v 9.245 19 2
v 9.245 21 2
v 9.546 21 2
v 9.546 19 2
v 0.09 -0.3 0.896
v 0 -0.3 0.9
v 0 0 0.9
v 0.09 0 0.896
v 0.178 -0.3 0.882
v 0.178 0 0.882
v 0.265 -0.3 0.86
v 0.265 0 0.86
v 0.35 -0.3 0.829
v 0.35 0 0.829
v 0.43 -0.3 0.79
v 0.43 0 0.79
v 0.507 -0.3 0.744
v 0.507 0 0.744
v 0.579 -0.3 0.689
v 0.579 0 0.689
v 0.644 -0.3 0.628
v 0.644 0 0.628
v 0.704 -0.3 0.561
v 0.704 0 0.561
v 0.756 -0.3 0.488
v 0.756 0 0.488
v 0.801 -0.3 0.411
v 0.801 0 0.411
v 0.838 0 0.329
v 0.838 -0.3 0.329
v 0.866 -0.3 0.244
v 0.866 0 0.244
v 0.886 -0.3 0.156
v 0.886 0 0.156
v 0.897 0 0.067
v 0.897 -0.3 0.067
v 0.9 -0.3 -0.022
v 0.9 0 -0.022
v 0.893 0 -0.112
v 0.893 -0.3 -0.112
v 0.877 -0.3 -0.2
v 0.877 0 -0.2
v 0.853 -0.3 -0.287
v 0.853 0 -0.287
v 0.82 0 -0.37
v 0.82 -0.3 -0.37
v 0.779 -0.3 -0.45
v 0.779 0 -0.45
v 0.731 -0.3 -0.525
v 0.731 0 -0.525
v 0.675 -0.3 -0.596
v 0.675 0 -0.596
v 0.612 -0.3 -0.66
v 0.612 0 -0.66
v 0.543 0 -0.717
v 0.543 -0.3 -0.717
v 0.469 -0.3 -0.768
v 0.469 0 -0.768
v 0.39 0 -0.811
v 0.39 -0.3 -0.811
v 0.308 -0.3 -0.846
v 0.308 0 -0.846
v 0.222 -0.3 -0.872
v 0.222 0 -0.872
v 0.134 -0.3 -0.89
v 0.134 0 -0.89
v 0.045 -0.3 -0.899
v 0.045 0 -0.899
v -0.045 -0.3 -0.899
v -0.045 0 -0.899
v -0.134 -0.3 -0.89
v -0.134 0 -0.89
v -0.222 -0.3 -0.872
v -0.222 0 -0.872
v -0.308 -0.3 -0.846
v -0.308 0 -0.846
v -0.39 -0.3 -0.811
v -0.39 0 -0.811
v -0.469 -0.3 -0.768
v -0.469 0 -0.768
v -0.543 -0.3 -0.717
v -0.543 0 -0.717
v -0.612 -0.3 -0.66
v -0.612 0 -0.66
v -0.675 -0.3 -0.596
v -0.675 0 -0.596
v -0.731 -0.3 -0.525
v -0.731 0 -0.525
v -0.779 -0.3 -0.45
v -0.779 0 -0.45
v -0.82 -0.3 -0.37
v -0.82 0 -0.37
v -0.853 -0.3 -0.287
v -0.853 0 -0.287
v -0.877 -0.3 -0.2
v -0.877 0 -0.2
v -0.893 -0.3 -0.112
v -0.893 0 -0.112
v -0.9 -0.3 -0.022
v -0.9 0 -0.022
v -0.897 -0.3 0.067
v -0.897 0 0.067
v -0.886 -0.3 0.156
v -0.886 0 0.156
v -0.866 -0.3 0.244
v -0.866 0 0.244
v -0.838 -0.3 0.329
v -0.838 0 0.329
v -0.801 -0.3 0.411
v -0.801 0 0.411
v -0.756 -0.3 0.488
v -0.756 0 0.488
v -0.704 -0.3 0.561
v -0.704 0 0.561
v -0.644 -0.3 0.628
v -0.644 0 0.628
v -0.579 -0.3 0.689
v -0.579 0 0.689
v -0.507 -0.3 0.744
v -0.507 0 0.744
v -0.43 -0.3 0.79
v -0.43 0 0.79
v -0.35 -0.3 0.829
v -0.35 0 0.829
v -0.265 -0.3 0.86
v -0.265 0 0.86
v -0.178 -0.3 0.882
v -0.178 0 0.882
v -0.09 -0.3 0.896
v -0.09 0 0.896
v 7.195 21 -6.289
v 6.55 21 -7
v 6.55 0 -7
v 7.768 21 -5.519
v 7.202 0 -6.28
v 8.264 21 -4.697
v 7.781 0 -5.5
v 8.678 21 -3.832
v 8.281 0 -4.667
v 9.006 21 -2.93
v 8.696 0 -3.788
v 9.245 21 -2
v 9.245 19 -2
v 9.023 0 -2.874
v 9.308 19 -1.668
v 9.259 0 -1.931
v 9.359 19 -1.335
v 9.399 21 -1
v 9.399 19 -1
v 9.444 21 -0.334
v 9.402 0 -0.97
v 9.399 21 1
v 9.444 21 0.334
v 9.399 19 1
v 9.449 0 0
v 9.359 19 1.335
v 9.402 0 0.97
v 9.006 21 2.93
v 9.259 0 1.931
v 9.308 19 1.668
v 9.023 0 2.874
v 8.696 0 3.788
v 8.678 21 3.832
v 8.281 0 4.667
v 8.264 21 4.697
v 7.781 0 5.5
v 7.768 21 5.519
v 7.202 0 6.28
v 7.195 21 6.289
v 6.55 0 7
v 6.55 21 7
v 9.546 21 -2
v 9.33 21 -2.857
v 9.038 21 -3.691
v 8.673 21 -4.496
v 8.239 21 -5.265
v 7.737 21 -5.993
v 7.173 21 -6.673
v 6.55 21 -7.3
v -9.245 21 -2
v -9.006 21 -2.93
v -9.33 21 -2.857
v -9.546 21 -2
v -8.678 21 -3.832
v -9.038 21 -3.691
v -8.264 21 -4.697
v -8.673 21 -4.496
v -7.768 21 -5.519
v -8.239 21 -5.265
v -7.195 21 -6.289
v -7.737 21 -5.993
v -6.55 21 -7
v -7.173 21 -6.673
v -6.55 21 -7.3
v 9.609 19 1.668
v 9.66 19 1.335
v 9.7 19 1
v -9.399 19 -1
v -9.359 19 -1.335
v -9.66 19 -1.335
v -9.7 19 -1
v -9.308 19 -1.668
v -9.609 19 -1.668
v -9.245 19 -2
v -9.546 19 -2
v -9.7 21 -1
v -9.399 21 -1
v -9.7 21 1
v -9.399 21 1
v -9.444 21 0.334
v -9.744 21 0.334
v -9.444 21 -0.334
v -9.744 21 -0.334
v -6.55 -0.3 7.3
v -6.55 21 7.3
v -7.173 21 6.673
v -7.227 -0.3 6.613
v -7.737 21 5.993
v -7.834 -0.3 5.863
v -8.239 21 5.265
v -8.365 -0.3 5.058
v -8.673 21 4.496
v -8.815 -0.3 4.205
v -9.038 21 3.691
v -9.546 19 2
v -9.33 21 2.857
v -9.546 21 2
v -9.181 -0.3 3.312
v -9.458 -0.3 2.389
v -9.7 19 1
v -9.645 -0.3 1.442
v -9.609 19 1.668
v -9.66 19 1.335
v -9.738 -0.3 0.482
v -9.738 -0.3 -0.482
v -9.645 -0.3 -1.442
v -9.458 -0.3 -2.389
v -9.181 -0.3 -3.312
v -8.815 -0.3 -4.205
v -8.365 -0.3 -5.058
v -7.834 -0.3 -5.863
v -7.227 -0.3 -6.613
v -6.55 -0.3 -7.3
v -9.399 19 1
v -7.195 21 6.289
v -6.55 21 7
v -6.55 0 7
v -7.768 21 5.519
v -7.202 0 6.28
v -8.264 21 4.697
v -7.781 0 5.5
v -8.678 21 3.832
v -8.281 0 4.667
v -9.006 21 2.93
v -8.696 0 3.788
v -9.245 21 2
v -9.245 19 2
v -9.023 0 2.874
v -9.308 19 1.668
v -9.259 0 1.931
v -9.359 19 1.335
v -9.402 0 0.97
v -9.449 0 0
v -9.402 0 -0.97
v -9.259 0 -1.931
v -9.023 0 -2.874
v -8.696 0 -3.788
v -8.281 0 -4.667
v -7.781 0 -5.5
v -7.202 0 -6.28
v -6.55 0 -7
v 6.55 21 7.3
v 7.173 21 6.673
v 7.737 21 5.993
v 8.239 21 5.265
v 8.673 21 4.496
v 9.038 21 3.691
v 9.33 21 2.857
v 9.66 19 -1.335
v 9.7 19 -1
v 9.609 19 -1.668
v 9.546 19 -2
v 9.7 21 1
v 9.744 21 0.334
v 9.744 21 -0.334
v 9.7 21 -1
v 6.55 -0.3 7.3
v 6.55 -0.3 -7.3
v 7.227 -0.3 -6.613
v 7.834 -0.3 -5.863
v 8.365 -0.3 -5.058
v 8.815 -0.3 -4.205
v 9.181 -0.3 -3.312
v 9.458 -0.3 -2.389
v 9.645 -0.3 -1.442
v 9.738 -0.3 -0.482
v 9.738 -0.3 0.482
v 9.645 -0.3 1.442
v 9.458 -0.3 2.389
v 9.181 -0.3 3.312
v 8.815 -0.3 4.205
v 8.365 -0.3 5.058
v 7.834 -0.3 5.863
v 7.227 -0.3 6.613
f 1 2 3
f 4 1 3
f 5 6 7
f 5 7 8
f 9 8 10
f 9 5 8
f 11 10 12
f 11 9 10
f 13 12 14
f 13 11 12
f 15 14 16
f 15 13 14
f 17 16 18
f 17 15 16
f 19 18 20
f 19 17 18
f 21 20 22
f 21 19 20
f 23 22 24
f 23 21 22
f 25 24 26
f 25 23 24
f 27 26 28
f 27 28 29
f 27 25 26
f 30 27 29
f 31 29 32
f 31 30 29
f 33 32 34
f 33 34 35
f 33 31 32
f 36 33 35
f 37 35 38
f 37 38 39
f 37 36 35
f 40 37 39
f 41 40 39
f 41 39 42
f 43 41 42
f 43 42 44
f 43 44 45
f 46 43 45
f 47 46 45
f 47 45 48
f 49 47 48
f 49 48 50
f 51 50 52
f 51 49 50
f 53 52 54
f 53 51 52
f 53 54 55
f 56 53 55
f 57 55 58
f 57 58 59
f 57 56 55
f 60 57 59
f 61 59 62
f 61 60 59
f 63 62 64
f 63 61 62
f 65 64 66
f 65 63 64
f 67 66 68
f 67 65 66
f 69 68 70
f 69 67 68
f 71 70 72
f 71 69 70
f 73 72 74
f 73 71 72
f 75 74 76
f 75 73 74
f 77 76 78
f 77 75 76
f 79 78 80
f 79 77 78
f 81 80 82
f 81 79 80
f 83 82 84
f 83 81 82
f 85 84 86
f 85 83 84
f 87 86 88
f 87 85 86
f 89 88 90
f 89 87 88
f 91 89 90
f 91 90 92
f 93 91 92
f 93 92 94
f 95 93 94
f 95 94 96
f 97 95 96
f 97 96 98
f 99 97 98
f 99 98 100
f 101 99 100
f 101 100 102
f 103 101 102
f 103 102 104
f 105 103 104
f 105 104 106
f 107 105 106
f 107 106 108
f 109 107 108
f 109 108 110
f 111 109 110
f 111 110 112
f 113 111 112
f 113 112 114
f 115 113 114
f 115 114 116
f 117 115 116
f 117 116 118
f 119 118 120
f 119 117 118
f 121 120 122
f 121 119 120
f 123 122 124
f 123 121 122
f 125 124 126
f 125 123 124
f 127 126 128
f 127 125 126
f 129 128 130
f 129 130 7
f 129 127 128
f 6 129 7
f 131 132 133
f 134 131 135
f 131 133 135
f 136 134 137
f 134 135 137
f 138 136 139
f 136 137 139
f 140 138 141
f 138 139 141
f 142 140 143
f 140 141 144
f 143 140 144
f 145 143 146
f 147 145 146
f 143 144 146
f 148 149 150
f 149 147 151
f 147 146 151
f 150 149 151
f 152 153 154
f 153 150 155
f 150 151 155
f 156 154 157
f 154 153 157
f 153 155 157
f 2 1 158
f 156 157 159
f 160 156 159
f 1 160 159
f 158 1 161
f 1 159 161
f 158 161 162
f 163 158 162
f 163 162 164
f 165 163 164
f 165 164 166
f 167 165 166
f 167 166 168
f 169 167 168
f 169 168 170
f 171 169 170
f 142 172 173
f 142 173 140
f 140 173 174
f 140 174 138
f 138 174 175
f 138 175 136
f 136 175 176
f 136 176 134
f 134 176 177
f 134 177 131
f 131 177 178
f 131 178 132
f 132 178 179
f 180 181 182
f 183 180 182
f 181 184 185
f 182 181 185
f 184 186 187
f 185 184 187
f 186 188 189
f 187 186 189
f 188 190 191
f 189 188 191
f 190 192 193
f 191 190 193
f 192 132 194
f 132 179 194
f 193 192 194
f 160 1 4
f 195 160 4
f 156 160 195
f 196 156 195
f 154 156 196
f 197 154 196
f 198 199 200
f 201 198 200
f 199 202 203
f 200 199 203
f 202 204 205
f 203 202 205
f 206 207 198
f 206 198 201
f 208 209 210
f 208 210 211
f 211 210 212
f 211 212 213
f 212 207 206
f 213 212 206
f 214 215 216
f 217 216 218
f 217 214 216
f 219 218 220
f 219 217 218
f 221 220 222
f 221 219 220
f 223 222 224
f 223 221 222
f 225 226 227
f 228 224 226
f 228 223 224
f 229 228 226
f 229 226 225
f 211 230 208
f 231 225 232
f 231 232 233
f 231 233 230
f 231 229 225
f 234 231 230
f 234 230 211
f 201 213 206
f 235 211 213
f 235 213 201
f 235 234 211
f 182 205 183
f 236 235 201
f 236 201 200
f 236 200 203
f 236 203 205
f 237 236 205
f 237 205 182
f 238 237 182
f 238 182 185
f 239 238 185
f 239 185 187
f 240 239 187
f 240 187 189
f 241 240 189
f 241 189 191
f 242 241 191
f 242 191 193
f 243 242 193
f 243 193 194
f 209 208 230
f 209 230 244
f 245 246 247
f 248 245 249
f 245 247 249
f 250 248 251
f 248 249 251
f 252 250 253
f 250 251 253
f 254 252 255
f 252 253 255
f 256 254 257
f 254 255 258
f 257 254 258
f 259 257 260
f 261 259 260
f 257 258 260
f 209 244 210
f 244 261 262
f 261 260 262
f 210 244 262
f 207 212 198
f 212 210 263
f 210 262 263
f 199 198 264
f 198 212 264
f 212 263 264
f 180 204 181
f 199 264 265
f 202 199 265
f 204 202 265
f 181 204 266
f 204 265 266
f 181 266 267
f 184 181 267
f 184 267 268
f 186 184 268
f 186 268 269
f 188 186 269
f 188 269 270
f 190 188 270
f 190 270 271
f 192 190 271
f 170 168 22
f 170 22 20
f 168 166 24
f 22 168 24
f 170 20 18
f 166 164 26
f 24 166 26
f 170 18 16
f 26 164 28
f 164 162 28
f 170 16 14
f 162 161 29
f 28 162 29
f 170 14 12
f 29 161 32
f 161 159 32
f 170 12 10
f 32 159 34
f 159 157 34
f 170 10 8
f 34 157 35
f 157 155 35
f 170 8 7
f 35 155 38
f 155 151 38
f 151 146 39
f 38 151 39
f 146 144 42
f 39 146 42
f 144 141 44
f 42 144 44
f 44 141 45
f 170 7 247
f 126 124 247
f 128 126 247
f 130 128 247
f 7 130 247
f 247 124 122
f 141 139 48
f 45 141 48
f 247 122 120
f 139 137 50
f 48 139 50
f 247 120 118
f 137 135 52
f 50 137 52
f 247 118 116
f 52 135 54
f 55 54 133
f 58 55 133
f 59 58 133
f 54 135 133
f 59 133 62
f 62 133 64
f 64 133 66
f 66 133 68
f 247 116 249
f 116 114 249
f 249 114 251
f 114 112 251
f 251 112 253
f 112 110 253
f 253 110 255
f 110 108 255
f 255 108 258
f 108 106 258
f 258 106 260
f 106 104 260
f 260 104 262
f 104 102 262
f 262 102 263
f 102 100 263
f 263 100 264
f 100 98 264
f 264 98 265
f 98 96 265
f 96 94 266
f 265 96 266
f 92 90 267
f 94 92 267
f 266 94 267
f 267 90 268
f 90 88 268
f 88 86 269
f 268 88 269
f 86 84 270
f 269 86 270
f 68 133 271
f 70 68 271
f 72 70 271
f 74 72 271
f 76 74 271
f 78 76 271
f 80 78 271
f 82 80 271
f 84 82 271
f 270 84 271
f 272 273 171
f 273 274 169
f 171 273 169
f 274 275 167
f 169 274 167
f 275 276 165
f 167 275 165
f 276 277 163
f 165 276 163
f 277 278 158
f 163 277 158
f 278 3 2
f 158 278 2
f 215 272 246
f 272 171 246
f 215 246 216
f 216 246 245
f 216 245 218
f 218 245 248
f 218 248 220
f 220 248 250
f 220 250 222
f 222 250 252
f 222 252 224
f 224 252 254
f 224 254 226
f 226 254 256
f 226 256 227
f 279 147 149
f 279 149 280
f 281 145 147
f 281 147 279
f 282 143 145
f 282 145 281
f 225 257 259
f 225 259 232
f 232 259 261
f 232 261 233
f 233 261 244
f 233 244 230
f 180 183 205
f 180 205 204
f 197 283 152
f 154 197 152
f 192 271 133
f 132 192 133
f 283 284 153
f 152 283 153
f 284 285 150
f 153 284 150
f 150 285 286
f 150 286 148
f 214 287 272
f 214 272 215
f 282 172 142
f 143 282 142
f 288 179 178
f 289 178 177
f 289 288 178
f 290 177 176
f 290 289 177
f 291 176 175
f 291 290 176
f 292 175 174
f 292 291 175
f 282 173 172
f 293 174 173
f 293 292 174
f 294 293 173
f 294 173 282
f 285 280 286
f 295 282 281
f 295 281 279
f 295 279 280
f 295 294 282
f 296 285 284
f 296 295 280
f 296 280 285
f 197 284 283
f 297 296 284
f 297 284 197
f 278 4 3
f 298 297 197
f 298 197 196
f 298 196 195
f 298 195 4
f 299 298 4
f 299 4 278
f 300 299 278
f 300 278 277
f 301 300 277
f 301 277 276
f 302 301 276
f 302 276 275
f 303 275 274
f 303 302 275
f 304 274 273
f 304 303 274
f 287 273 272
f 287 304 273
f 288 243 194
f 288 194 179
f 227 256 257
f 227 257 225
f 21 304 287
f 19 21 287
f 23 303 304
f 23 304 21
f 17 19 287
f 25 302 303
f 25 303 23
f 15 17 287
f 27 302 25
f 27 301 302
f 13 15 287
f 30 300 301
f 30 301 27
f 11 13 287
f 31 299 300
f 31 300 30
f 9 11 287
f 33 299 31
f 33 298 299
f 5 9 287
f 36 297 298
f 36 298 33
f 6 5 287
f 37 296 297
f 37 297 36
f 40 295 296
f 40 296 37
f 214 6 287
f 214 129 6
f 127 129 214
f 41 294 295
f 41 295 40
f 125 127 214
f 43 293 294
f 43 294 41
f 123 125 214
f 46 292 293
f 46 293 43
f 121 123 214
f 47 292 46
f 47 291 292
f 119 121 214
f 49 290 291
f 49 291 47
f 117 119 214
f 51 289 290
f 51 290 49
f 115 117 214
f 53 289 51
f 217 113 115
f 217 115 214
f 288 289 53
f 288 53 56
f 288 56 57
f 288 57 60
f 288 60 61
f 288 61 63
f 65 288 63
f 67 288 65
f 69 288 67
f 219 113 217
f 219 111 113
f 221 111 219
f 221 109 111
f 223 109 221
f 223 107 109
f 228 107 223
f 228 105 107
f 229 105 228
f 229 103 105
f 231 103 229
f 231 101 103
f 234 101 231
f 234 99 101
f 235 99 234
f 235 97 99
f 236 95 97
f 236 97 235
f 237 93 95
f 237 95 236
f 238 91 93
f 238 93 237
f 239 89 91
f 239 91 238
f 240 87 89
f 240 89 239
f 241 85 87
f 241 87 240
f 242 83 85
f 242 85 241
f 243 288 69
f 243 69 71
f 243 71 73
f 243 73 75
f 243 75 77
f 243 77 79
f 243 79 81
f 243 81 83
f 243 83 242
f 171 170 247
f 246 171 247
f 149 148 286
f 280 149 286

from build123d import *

# Parameters (mm, degrees)
BOSS_EXTRUDE1_DEPTH = 21
BOSS_EXTRUDE2_START = -0.3
SKETCH3_R           = 0.9
BOSS_EXTRUDE2_DEPTH = 0.3
CUT_EXTRUDE1_DEPTH  = 2


with BuildPart() as part:
    # Sketch2 → Boss-Extrude1 (new body)
    with BuildSketch(Plane(origin=(0, 0, 0), x_dir=(1, 0, 0), z_dir=(0, 1, 0))):
        with BuildLine():
            Line((-6.55, 7.3), (6.55, 7.3))
            ThreePointArc((6.55, 7.3), (9.75, 0), (6.55, -7.3))
            Line((6.55, -7.3), (-6.55, -7.3))
            ThreePointArc((-6.55, -7.3), (-9.75, 0), (-6.55, 7.3))
        make_face()
        with BuildLine():
            Line((-6.55, 7), (6.55, 7))
            ThreePointArc((6.55, 7), (9.449494937, 0), (6.55, -7))
            Line((6.55, -7), (-6.55, -7))
            ThreePointArc((-6.55, -7), (-9.449494937, 0), (-6.55, 7))
        make_face(mode=Mode.SUBTRACT)
    extrude(amount=BOSS_EXTRUDE1_DEPTH)

    # Sketch3 → Boss-Extrude2 (add)
    with BuildSketch(Plane(origin=(0, 0, 0), x_dir=(1, 0, 0), z_dir=(0, 1, 0)).offset(BOSS_EXTRUDE2_START)):
        with BuildLine():
            Line((-6.55, 7.3), (6.55, 7.3))
            ThreePointArc((6.55, 7.3), (9.75, 0), (6.55, -7.3))
            Line((6.55, -7.3), (-6.55, -7.3))
            ThreePointArc((-6.55, -7.3), (-9.75, 0), (-6.55, 7.3))
        make_face()
        with Locations(Location((0, 0, 0), (0, 0, 270))):
            Circle(SKETCH3_R, mode=Mode.SUBTRACT)
    extrude(amount=BOSS_EXTRUDE2_DEPTH)

    # Sketch4 → Cut-Extrude1 (cut)
    with BuildSketch(Plane(origin=(0, 21, 0), x_dir=(1, 0, 0), z_dir=(0, 1, 0))):
        Polygon((-7.631188375, 1), (-14.631115783, 1), (-14.631115783, -1), (-7.538875612, -1), (-7.538875612, -2), (-15.384565747, -2), (-15.384565747, 2), (-7.631188375, 2), align=None)
        Polygon((7.631188375, 2), (7.631188375, 1), (14.631115783, 1), (14.631115783, -1), (7.538875612, -1), (7.538875612, -2), (15.384565747, -2), (15.384565747, 2), align=None)
    extrude(amount=-CUT_EXTRUDE1_DEPTH, mode=Mode.SUBTRACT)


solid = part.part
